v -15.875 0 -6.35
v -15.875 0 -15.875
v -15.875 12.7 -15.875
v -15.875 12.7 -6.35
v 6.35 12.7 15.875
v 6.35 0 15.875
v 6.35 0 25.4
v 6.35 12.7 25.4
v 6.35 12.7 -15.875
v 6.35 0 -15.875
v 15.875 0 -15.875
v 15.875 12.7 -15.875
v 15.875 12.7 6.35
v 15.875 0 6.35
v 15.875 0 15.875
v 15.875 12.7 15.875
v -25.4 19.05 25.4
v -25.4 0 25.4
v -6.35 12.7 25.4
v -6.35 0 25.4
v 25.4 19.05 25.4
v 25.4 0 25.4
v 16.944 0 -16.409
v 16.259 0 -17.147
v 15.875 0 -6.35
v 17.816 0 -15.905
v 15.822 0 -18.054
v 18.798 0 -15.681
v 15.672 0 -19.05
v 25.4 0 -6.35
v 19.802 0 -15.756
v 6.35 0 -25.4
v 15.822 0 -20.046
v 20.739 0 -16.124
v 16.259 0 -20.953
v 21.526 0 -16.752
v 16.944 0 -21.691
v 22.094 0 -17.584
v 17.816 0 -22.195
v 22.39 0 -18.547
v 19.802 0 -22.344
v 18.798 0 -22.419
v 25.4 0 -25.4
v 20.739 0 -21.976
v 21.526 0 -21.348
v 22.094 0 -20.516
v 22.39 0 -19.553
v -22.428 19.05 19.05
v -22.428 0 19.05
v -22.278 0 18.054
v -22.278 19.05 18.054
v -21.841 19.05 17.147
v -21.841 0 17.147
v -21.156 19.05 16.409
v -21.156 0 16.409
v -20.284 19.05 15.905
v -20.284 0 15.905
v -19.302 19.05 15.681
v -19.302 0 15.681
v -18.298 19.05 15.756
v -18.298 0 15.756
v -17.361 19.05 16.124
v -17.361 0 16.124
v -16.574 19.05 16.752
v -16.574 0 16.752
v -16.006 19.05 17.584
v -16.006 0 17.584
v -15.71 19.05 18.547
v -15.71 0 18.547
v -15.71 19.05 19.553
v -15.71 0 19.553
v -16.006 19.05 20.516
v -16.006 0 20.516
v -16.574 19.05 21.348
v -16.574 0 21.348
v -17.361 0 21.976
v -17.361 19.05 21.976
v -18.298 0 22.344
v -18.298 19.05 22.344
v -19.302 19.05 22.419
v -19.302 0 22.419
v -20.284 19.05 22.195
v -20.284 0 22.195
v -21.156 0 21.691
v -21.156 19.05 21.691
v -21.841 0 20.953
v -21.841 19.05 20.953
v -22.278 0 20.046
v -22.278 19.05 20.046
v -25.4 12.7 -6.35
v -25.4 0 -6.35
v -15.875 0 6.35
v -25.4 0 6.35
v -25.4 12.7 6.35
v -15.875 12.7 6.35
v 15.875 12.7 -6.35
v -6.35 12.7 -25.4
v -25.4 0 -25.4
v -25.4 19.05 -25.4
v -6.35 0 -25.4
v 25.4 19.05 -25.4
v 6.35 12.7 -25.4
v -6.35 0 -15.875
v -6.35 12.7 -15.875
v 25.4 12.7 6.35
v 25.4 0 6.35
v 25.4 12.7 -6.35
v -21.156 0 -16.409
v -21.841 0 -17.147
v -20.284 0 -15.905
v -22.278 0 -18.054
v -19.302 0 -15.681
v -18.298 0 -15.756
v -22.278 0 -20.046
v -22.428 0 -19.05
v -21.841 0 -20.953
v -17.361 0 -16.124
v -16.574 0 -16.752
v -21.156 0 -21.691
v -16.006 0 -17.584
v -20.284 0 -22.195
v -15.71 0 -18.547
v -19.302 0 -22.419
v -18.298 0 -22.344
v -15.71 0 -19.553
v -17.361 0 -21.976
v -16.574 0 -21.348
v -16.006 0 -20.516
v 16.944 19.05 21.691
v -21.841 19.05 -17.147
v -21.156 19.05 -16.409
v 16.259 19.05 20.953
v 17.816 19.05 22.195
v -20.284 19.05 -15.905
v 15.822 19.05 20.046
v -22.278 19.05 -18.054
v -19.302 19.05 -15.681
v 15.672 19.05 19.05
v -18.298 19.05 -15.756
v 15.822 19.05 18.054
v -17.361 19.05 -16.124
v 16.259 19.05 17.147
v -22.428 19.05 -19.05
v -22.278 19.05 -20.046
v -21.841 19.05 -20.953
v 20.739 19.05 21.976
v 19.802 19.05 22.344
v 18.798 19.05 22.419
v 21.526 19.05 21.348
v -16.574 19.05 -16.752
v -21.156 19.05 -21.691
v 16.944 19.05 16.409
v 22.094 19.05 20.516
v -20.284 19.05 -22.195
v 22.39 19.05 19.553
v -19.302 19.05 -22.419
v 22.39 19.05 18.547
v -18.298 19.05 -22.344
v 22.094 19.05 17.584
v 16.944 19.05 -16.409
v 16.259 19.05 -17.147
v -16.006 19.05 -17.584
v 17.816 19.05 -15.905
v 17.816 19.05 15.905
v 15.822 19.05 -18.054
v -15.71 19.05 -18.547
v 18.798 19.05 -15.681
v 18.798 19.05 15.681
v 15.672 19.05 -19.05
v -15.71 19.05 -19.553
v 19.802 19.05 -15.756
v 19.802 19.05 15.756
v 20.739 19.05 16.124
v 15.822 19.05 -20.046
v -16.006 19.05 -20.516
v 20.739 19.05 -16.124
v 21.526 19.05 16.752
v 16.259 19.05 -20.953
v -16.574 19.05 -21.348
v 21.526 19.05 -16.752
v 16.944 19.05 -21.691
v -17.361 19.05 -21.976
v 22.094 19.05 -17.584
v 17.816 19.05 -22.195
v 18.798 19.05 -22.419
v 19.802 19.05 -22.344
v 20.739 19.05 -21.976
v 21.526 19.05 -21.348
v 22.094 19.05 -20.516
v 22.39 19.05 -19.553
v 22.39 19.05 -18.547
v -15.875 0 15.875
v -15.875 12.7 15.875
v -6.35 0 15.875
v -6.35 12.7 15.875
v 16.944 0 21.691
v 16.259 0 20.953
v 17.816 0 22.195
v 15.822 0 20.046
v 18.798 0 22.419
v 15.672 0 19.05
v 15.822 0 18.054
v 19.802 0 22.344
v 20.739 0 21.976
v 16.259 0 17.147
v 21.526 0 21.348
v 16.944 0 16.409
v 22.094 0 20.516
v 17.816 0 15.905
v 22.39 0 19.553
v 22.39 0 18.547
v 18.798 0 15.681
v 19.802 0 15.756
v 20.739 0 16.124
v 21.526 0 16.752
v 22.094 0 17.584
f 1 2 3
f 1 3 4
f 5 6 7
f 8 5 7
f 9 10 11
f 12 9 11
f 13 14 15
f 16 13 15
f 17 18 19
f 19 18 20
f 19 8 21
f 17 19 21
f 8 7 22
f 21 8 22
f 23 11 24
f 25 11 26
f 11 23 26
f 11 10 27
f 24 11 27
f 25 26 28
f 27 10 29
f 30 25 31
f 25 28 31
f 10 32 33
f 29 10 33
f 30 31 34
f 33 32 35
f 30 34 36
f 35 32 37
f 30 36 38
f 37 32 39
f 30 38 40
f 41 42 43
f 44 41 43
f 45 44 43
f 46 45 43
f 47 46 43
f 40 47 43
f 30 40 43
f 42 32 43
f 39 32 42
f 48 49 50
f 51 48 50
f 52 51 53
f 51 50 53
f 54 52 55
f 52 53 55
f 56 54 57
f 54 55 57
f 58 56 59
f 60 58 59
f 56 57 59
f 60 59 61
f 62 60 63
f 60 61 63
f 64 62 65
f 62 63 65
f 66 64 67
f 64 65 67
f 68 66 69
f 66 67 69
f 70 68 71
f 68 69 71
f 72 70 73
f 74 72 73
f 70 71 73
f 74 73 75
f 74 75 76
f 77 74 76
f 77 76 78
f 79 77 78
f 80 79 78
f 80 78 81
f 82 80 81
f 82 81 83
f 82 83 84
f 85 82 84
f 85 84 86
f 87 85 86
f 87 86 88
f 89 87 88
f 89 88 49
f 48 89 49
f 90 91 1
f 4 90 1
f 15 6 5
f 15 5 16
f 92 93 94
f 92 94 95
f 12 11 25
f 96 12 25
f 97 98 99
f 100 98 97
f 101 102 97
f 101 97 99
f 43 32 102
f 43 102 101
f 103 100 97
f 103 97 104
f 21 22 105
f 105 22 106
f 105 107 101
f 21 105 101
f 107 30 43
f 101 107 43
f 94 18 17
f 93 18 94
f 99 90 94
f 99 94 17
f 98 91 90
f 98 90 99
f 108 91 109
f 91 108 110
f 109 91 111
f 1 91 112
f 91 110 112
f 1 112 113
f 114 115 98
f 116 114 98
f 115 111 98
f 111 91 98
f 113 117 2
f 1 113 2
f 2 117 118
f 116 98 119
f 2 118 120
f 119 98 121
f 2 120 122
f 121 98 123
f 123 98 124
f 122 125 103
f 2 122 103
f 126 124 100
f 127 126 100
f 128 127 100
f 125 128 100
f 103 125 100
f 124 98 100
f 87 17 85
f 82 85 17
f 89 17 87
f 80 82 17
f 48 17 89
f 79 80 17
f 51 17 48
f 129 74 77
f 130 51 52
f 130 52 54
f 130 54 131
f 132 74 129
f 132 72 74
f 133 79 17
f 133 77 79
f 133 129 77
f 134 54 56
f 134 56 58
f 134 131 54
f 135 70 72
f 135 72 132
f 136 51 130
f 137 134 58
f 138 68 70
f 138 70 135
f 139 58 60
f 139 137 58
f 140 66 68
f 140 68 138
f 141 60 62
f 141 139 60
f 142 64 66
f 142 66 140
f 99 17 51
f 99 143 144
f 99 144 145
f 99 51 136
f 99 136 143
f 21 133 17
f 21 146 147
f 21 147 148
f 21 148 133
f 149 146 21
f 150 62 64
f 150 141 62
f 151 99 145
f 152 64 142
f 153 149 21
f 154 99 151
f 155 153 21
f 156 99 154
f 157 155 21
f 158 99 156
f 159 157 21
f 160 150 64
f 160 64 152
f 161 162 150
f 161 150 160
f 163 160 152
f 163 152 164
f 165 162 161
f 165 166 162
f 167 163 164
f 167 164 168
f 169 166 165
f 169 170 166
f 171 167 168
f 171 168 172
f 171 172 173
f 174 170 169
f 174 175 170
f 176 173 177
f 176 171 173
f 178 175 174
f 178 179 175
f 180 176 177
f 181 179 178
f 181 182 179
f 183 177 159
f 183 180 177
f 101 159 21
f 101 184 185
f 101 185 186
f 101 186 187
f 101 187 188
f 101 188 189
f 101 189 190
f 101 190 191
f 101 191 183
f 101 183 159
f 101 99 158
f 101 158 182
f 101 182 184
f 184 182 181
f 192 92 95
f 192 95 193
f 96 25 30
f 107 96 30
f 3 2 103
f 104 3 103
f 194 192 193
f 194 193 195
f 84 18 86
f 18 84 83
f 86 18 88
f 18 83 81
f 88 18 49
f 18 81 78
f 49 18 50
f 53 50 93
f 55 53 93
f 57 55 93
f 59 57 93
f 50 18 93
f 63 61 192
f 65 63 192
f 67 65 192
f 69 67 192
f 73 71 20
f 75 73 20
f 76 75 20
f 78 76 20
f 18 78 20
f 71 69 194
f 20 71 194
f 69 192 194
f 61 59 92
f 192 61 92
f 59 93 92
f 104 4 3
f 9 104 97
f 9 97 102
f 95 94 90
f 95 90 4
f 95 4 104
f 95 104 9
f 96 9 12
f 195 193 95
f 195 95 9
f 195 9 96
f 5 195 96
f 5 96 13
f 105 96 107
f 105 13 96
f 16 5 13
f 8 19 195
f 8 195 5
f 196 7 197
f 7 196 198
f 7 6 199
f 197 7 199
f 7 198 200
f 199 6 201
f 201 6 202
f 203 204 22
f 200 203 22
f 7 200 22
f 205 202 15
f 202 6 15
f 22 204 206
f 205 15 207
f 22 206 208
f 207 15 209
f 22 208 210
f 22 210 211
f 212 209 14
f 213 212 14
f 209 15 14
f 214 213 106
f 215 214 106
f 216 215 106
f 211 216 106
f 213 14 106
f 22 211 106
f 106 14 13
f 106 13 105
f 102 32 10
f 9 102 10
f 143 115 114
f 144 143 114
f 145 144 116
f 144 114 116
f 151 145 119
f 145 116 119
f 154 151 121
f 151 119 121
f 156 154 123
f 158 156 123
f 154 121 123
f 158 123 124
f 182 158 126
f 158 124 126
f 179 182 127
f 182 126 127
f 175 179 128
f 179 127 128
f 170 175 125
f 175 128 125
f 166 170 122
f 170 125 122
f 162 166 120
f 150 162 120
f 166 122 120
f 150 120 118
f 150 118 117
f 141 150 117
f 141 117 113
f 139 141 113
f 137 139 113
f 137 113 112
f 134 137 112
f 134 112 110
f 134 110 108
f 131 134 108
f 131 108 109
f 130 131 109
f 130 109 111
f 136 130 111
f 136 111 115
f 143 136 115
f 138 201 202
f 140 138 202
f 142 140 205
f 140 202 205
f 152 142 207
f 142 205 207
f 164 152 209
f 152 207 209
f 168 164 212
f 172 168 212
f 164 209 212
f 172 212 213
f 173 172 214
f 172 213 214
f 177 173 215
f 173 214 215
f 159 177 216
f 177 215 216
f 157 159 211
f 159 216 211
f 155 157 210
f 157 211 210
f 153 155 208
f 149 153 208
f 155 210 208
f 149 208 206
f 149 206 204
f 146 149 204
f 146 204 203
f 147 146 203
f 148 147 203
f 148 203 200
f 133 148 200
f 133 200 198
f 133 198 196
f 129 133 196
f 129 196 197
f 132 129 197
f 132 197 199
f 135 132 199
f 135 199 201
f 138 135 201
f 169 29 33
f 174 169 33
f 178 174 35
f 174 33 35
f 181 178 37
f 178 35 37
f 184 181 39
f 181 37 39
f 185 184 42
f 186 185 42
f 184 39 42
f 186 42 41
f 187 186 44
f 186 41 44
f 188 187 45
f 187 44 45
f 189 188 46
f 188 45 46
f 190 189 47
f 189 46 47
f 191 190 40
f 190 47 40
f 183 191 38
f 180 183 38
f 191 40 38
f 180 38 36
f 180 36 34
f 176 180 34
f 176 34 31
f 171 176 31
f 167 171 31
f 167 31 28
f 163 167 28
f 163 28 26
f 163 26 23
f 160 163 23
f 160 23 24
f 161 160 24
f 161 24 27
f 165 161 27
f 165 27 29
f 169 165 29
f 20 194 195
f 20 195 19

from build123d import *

# Parameters (mm, degrees)
SKETCH1_W               = 50.8
SKETCH1_H               = 50.8
BOSS_EXTRUDE1_DEPTH     = 19.05
F_1_4_CLEARANCE_HOLE1_D = 6.7564
SKETCH9_W               = 12.7
SKETCH9_H               = 50.8
SKETCH9_W_2             = 50.8
SKETCH9_H_2             = 12.7
SKETCH9_W_3             = 31.75
SKETCH9_H_3             = 31.75
CUT_EXTRUDE1_DEPTH      = 12.7


with BuildPart() as part:
    # Sketch1 → Boss-Extrude1 (new body)
    with BuildSketch(Plane(origin=(0, 0, 0), x_dir=(1, 0, 0), z_dir=(0, 1, 0))):
        Rectangle(SKETCH1_W, SKETCH1_H)
    extrude(amount=BOSS_EXTRUDE1_DEPTH)

    # 1/4 Clearance Hole1 (through all)
    with Locations(Plane(origin=(0, 19.05, 0), x_dir=(1, 0, 0), z_dir=(0, 1, 0))):
        with Locations((-19.05, 19.05), (19.05, 19.05), (19.05, -19.05), (-19.05, -19.05)):
            Hole(F_1_4_CLEARANCE_HOLE1_D / 2)

    # Sketch9 → Cut-Extrude1 (cut)
    with BuildSketch(Plane.XZ):
        Rectangle(SKETCH9_W, SKETCH9_H)
        Rectangle(SKETCH9_W_2, SKETCH9_H_2)
        Rectangle(SKETCH9_W_3, SKETCH9_H_3)
    extrude(amount=-CUT_EXTRUDE1_DEPTH, mode=Mode.SUBTRACT)


solid = part.part
